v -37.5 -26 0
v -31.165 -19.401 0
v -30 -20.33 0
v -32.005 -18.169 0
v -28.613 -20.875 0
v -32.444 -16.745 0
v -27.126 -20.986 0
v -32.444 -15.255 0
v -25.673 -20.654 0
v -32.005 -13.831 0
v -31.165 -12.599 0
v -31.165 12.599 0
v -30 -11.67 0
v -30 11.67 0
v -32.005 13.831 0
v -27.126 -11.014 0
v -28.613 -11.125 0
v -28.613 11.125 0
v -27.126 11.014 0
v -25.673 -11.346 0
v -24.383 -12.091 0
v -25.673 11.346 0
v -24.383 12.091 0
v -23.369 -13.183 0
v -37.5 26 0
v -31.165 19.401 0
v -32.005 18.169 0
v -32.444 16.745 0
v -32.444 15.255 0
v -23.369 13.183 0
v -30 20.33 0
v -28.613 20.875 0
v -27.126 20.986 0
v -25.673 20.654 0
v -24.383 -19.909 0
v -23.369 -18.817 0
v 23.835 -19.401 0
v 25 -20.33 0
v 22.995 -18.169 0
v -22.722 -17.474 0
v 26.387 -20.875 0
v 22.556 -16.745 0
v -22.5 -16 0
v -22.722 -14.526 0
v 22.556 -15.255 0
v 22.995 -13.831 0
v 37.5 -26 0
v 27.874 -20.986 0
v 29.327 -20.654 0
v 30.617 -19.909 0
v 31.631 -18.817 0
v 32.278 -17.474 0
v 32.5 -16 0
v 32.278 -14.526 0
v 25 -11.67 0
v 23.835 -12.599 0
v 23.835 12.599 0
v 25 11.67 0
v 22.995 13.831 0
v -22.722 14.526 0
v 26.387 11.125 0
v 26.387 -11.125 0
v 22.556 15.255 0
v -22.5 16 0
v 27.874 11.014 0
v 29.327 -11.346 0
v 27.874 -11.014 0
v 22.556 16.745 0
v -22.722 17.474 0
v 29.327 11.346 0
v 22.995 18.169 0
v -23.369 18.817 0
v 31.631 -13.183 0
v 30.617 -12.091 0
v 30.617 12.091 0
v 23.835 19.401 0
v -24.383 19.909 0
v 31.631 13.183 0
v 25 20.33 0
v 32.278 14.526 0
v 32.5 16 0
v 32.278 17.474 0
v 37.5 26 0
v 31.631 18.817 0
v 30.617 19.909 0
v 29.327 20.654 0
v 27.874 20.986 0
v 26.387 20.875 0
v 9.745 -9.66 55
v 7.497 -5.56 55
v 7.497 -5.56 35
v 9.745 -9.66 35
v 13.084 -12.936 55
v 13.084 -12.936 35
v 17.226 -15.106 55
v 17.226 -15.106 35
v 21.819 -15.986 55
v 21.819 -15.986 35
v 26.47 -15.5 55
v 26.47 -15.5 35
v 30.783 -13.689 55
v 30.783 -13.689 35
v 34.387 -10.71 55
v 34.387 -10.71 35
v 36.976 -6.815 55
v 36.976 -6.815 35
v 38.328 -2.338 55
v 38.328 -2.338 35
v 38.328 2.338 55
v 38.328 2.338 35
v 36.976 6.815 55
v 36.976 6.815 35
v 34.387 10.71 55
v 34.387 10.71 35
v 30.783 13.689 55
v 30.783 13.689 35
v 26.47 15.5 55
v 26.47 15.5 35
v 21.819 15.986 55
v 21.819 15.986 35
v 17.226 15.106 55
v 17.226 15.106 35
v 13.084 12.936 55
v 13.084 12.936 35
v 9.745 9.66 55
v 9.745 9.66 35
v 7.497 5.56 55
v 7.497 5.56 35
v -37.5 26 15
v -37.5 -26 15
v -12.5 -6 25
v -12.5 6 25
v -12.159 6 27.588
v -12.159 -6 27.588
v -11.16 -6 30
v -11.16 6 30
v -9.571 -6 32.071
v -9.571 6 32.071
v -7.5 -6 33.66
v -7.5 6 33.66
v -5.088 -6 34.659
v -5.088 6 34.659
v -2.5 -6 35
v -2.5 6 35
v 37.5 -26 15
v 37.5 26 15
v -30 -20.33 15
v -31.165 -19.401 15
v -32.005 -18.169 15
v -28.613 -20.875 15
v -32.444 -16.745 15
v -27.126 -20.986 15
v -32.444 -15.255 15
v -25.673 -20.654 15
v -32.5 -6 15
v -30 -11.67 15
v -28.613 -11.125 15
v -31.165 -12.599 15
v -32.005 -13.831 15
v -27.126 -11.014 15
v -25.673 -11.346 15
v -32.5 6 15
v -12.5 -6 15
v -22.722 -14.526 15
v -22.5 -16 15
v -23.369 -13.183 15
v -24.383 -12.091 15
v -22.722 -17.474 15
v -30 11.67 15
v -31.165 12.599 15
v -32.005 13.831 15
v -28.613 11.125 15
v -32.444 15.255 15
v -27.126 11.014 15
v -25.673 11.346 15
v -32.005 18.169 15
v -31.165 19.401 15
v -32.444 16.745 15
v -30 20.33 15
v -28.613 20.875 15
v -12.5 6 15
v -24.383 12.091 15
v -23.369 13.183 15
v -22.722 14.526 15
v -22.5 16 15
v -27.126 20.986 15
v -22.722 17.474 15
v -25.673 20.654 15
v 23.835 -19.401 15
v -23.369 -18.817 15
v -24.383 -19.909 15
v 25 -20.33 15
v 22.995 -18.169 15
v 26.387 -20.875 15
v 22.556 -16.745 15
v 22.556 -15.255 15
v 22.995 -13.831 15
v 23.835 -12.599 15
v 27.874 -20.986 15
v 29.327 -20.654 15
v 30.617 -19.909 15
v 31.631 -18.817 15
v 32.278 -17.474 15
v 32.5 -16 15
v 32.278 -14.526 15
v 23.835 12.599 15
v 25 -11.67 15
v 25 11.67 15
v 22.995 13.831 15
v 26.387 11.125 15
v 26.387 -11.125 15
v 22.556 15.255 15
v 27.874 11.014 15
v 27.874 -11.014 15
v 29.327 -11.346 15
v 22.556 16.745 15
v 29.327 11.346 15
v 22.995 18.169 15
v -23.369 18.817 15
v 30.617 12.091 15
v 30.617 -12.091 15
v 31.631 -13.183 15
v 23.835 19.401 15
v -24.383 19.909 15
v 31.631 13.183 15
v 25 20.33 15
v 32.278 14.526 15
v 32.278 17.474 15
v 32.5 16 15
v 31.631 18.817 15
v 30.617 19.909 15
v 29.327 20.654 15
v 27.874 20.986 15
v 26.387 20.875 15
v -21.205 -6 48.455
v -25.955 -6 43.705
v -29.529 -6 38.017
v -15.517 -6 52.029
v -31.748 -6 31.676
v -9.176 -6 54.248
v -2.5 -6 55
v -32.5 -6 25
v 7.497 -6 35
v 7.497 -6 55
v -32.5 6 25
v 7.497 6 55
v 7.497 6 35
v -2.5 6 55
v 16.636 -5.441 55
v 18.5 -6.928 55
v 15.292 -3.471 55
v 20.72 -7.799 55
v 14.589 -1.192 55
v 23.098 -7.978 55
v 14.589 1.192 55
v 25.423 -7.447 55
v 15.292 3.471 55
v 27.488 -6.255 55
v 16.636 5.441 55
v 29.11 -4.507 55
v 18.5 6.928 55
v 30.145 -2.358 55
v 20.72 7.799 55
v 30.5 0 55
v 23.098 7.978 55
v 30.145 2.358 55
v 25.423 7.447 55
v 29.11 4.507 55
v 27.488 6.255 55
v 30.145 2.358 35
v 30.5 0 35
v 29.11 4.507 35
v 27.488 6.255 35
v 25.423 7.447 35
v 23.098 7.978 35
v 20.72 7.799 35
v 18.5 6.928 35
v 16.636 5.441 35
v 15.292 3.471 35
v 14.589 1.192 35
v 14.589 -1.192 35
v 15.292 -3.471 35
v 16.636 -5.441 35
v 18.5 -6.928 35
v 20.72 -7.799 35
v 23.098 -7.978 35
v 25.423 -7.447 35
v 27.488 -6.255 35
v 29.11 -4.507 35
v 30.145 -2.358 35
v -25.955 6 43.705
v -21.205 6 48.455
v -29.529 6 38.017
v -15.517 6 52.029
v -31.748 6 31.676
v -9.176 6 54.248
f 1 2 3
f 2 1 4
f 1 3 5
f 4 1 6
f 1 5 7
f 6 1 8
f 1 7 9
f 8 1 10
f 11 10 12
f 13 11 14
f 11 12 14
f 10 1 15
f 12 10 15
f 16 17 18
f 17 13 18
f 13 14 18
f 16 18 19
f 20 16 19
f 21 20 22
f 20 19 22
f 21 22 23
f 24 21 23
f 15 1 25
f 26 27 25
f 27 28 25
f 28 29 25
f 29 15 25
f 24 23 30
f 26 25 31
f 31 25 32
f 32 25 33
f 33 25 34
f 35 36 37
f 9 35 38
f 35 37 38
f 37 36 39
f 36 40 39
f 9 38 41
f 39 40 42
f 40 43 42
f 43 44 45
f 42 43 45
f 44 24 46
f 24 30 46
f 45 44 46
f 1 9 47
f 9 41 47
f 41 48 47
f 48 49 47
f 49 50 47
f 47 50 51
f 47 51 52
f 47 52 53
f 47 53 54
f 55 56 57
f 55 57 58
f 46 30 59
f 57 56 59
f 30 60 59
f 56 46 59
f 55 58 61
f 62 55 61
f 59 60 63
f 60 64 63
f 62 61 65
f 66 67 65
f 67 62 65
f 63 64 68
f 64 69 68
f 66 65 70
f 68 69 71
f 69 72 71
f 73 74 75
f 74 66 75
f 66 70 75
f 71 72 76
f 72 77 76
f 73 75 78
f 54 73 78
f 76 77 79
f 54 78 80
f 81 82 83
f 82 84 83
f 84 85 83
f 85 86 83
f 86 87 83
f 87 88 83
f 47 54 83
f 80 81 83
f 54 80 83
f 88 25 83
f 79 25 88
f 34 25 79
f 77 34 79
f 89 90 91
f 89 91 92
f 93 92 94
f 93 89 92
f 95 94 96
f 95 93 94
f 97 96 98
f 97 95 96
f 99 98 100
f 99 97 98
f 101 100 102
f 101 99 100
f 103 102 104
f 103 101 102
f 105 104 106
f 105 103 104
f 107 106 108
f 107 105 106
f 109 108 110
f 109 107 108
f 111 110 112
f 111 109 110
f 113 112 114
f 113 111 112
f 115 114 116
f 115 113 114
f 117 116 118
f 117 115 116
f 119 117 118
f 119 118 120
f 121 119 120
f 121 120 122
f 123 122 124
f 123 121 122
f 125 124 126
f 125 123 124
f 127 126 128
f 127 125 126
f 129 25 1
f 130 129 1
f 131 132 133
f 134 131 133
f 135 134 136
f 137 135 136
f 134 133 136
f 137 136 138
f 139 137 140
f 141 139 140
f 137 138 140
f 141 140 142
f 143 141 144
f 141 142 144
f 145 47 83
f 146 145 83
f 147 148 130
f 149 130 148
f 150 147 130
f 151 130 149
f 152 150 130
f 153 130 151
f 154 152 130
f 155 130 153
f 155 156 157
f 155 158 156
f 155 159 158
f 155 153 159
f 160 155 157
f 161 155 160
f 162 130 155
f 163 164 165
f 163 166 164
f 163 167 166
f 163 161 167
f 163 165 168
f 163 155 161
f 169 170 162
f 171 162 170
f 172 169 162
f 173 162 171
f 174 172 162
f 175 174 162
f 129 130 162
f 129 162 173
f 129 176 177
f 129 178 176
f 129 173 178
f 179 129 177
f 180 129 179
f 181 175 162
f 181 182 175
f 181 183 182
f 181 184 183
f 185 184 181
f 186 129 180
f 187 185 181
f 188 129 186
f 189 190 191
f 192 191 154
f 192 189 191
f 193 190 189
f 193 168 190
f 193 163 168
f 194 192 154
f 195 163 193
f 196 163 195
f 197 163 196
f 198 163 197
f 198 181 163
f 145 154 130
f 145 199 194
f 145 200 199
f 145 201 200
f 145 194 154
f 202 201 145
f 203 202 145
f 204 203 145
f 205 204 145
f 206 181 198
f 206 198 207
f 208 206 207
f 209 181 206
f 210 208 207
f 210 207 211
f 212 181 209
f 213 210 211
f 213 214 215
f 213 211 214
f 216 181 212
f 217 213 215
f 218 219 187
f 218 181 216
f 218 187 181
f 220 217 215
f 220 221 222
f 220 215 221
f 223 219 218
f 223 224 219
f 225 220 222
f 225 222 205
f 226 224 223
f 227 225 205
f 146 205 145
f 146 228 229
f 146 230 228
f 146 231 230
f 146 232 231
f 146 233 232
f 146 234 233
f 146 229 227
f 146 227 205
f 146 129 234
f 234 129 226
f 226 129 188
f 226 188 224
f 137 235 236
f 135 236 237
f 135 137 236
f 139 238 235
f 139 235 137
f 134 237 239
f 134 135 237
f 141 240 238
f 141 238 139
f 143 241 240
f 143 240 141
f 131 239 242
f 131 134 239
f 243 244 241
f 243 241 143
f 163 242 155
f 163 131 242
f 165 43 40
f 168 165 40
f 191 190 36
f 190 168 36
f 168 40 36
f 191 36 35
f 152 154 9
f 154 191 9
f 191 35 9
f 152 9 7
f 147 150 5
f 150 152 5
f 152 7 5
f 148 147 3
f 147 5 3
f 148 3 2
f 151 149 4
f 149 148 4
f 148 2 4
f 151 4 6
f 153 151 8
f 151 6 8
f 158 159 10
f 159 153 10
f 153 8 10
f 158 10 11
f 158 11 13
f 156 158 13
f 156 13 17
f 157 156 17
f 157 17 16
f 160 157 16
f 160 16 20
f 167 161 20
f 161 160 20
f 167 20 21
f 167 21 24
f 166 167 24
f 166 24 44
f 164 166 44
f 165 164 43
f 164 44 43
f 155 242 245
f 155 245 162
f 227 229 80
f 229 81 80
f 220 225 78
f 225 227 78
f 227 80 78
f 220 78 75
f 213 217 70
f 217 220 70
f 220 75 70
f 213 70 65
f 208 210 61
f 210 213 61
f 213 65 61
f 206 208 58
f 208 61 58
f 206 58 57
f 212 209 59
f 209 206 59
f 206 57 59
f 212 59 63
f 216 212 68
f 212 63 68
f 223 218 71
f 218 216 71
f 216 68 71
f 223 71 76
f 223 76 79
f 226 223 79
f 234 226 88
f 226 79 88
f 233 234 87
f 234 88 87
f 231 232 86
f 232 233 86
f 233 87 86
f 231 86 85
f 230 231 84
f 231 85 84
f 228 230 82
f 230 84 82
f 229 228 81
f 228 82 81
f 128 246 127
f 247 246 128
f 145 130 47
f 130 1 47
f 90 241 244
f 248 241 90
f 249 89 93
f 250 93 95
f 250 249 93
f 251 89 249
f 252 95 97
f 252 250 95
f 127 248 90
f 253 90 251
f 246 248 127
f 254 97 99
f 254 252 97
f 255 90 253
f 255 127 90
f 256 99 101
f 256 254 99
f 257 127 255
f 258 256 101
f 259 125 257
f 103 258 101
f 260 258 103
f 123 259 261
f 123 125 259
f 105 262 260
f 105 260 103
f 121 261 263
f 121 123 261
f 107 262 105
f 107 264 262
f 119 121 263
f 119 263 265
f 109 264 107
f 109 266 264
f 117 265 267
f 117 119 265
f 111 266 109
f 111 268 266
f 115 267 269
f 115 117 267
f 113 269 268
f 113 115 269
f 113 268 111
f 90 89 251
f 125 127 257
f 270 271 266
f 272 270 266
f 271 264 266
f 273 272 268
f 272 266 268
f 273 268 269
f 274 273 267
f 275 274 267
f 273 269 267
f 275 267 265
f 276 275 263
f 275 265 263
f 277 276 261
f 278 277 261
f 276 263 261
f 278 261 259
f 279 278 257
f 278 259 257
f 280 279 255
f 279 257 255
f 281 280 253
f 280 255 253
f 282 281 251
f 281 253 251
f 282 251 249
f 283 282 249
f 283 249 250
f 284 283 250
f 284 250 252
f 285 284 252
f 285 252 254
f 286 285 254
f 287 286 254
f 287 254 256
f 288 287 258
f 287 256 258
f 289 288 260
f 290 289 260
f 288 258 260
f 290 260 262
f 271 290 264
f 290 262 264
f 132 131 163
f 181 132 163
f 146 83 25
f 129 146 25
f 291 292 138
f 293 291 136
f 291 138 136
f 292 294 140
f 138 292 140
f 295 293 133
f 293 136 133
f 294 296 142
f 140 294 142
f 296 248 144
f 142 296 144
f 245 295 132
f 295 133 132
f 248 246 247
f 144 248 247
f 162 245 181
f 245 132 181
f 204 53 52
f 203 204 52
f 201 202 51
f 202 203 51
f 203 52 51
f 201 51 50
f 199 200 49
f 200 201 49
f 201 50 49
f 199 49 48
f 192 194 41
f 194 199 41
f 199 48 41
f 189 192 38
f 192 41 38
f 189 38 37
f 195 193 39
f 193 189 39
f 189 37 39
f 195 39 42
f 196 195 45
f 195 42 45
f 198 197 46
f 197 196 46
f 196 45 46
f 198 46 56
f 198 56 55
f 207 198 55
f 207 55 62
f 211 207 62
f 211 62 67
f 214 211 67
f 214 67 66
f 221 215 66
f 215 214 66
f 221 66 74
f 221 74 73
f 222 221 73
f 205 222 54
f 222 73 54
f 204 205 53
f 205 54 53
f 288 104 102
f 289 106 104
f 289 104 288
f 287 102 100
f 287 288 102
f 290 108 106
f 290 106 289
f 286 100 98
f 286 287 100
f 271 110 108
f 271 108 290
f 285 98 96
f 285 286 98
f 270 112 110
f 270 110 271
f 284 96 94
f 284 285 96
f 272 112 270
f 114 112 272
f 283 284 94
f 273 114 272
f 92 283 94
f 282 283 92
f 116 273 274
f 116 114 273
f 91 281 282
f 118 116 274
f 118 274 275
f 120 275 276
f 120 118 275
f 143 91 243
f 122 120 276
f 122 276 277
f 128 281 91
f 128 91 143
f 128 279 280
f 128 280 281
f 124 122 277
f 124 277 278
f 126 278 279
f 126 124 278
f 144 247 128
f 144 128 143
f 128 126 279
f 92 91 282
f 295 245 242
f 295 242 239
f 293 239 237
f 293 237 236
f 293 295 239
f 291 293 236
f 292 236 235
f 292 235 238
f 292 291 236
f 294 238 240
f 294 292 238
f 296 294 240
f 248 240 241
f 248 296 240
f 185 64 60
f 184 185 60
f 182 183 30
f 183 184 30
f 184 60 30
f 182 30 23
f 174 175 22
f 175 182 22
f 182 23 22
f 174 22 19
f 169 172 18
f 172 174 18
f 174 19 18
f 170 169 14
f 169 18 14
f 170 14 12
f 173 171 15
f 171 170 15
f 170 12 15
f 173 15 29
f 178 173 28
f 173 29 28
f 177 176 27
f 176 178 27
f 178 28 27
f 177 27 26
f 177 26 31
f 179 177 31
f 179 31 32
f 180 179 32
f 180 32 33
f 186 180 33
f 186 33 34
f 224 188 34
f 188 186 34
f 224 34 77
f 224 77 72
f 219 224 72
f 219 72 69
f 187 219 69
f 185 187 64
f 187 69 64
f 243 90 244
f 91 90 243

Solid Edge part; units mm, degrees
sketch "Sketch1" plane through (0, 0, 0) normal (0, 0, 1) x (1, 0, 0)
  line L0 (-37.5, -26) -> (37.5, -26)
  line L1 (37.5, -26) -> (37.5, 26)
  line L2 (37.5, 26) -> (-37.5, 26)
  line L3 (-37.5, 26) -> (-37.5, -26)
  circle A0 centre (27.5, -16) radius 5
  circle A1 centre (27.5, 16) radius 5
  circle A2 centre (-27.5, -16) radius 5
  circle A3 centre (-27.5, 16) radius 5
  dimension "D1" = 10
extrude "Protrusion1" add sketch "Sketch1" along normal blind 15
sketch "Sketch2" plane through (0, 0, 0) normal (0, -1, 0) x (1, 0, 0)
  line L0 (-12.5, 15) -> (-12.5, 25)
  arc A0 (-12.5, 25) -> (-2.5, 35) centre (-2.5, 25) cw
  line L1 (7.497, 35) -> (-2.5, 35)
  line L2 (7.497, 55) -> (7.497, 35)
  line L3 (-2.5, 55) -> (7.497, 55)
  arc A1 (-32.5, 25) -> (-2.5, 55) centre (-2.5, 25) cw
  line L4 (-32.5, 15) -> (-32.5, 25)
extrude "ExtrudedProtrusion_2" add sketch "Sketch2" along normal mid plane 12 material side at (-12.55, 0, 20)
sketch "Sketch3" plane through (2.4985, 0, 55) normal (0, 0, 1) x (1, 0, 0)
  circle A0 centre (20.0015, 0) radius 16
  circle A1 centre (20.0015, 0) radius 8
extrude "ExtrudedProtrusion_3" add sketch "Sketch3" against normal blind 20
